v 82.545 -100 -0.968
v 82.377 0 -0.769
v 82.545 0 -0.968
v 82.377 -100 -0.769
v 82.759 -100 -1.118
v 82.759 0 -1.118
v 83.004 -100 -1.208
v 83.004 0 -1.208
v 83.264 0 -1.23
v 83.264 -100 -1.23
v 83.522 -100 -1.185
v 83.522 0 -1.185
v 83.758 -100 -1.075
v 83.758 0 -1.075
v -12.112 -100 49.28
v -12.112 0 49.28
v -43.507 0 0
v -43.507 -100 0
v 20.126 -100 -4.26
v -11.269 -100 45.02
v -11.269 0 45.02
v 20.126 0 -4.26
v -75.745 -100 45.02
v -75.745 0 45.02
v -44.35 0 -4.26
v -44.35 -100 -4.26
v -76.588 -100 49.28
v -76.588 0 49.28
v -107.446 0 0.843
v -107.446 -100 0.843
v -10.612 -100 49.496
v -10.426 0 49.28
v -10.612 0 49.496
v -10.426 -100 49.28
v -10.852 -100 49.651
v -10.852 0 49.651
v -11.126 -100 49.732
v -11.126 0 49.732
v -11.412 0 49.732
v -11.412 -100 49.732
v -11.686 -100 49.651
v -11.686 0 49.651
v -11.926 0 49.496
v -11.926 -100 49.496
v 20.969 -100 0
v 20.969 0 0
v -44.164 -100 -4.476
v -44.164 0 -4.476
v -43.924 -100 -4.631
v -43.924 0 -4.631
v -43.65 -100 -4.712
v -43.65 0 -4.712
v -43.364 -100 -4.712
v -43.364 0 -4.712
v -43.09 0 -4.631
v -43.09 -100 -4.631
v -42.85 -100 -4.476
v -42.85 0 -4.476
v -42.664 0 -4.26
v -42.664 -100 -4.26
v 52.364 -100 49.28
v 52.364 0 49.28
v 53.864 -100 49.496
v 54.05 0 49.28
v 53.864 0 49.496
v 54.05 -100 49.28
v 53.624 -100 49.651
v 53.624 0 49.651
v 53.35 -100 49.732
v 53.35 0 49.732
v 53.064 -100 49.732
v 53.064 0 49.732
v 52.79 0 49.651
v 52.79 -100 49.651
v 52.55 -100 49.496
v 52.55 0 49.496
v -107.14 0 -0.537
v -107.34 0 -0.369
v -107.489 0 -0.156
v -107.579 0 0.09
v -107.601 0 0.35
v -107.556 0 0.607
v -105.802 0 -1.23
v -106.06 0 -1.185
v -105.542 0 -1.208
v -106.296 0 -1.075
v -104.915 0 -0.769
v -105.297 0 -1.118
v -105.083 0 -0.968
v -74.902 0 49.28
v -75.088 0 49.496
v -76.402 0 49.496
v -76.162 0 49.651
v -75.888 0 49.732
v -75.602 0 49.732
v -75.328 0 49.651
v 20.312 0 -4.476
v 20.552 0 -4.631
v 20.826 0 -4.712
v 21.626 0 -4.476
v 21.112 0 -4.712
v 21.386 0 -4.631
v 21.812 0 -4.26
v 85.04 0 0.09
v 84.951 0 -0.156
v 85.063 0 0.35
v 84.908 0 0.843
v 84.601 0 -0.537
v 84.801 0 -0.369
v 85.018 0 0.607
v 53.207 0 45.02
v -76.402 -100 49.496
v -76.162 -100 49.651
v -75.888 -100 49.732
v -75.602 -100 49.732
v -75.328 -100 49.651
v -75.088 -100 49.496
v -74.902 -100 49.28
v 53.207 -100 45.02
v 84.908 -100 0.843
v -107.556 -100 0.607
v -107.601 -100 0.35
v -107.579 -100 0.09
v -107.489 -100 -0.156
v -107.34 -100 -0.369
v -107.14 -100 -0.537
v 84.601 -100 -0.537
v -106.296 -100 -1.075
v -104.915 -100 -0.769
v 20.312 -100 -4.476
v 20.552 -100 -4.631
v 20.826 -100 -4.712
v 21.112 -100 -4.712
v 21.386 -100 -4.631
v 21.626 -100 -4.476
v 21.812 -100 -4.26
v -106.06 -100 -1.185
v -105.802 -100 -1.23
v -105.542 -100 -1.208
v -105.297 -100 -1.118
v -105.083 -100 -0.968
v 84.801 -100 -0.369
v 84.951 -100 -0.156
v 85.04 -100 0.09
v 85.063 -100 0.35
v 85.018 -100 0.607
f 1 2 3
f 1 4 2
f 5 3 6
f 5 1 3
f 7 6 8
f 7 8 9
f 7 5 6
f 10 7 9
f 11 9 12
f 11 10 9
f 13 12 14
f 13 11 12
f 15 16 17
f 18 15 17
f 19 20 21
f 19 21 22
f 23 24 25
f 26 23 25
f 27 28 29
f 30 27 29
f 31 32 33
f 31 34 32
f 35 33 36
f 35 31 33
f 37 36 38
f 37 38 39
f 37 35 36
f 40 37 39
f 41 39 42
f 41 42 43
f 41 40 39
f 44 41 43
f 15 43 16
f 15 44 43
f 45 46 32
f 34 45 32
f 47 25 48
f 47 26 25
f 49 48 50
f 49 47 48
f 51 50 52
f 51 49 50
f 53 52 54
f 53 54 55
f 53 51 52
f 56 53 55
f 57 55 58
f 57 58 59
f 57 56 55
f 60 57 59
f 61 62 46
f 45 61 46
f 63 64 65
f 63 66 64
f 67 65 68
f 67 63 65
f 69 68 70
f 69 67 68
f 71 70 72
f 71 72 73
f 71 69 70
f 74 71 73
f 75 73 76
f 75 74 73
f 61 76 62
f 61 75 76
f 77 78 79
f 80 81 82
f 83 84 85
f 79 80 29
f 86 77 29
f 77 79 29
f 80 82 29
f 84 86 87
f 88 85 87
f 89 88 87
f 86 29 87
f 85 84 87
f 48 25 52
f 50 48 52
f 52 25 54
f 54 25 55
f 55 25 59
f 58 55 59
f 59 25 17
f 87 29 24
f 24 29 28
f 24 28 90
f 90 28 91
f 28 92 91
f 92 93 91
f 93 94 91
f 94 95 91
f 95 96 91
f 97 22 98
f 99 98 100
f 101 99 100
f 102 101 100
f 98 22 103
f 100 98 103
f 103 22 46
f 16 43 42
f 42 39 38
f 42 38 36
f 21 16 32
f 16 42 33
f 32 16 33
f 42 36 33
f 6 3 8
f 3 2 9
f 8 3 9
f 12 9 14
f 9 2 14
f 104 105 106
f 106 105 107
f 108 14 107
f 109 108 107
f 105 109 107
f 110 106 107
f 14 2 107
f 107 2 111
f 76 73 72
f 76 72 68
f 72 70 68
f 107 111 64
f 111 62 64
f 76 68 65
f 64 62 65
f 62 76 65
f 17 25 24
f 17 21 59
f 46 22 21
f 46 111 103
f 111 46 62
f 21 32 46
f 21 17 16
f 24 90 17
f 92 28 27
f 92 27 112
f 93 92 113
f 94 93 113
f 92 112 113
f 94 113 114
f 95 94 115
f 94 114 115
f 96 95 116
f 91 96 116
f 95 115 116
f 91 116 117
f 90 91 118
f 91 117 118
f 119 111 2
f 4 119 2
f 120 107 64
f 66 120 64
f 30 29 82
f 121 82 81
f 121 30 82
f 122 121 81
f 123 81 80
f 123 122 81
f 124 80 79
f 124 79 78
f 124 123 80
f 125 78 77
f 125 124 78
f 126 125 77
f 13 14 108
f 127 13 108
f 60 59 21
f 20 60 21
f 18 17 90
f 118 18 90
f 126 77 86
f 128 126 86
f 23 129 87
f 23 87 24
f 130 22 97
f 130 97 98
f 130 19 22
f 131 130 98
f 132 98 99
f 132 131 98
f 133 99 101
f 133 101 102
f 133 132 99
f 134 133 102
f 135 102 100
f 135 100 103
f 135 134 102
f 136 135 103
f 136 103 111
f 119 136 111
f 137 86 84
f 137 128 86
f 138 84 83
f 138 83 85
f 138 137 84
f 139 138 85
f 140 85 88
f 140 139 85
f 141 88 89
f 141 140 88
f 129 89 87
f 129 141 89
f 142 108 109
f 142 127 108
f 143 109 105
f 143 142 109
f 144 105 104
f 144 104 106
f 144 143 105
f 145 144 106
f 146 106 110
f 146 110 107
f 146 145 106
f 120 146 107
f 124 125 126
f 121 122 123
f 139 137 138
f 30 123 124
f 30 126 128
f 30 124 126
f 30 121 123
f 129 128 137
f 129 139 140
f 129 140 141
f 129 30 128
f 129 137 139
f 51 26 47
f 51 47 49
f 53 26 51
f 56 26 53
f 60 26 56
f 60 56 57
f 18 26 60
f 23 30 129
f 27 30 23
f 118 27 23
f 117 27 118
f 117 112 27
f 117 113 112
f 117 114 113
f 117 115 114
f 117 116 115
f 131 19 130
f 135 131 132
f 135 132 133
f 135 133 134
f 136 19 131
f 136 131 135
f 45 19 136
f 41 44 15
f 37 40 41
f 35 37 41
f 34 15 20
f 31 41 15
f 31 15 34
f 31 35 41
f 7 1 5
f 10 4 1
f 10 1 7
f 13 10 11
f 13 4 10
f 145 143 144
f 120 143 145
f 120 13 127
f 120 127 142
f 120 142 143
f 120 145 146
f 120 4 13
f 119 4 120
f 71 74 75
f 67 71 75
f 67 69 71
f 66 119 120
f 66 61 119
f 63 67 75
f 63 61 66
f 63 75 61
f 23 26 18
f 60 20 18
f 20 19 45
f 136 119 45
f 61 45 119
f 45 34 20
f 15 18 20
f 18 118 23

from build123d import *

# Parameters (mm, degrees)
F1_DEPTH = 100
F2_R     = 1


# Not quite as in the source:
# - ends of sketch curves that miss each other by under 0.0002 mm in the source are joined


with BuildPart() as f1:
    # F0 (on Front) → F1 (new body)
    with BuildSketch(Plane.XZ):
        Polygon((-75.7449854628, 50.6034867488), (-107.9829619636, 0), (-105.4527876261, -1.611898825), (-75.7449854628, 45.0200097587), (-43.5070133628, -5.5834700822), (-11.2690412628, 45.0200097587), (20.9689308372, -5.5834700822), (53.2069029372, 45.0200097587), (82.9147051006, -1.611898825), (85.444879438, 0), (53.2069029372, 50.6034867488), (20.9689264364, 0), (-11.2690412628, 50.6034867488), (-43.5070177636, 0), align=None)
    extrude(amount=F1_DEPTH)

    # F2
    f2_edges = [f1.edges().sort_by_distance(p)[0] for p in [
        (53.206903, -50, 50.603487),
        (-11.269041, -50, 50.603487),
        (-75.744985, -50, 50.603487),
        (-43.507013, -50, -5.58347),
        (20.968931, -50, -5.58347),
        (82.914705, -50, -1.611899),
        (-105.452788, -50, -1.611899),
        (-107.982962, -50, 0),
        (85.444879, -50, 0),
    ]]
    fillet(f2_edges, radius=F2_R)


solid = f1.part
